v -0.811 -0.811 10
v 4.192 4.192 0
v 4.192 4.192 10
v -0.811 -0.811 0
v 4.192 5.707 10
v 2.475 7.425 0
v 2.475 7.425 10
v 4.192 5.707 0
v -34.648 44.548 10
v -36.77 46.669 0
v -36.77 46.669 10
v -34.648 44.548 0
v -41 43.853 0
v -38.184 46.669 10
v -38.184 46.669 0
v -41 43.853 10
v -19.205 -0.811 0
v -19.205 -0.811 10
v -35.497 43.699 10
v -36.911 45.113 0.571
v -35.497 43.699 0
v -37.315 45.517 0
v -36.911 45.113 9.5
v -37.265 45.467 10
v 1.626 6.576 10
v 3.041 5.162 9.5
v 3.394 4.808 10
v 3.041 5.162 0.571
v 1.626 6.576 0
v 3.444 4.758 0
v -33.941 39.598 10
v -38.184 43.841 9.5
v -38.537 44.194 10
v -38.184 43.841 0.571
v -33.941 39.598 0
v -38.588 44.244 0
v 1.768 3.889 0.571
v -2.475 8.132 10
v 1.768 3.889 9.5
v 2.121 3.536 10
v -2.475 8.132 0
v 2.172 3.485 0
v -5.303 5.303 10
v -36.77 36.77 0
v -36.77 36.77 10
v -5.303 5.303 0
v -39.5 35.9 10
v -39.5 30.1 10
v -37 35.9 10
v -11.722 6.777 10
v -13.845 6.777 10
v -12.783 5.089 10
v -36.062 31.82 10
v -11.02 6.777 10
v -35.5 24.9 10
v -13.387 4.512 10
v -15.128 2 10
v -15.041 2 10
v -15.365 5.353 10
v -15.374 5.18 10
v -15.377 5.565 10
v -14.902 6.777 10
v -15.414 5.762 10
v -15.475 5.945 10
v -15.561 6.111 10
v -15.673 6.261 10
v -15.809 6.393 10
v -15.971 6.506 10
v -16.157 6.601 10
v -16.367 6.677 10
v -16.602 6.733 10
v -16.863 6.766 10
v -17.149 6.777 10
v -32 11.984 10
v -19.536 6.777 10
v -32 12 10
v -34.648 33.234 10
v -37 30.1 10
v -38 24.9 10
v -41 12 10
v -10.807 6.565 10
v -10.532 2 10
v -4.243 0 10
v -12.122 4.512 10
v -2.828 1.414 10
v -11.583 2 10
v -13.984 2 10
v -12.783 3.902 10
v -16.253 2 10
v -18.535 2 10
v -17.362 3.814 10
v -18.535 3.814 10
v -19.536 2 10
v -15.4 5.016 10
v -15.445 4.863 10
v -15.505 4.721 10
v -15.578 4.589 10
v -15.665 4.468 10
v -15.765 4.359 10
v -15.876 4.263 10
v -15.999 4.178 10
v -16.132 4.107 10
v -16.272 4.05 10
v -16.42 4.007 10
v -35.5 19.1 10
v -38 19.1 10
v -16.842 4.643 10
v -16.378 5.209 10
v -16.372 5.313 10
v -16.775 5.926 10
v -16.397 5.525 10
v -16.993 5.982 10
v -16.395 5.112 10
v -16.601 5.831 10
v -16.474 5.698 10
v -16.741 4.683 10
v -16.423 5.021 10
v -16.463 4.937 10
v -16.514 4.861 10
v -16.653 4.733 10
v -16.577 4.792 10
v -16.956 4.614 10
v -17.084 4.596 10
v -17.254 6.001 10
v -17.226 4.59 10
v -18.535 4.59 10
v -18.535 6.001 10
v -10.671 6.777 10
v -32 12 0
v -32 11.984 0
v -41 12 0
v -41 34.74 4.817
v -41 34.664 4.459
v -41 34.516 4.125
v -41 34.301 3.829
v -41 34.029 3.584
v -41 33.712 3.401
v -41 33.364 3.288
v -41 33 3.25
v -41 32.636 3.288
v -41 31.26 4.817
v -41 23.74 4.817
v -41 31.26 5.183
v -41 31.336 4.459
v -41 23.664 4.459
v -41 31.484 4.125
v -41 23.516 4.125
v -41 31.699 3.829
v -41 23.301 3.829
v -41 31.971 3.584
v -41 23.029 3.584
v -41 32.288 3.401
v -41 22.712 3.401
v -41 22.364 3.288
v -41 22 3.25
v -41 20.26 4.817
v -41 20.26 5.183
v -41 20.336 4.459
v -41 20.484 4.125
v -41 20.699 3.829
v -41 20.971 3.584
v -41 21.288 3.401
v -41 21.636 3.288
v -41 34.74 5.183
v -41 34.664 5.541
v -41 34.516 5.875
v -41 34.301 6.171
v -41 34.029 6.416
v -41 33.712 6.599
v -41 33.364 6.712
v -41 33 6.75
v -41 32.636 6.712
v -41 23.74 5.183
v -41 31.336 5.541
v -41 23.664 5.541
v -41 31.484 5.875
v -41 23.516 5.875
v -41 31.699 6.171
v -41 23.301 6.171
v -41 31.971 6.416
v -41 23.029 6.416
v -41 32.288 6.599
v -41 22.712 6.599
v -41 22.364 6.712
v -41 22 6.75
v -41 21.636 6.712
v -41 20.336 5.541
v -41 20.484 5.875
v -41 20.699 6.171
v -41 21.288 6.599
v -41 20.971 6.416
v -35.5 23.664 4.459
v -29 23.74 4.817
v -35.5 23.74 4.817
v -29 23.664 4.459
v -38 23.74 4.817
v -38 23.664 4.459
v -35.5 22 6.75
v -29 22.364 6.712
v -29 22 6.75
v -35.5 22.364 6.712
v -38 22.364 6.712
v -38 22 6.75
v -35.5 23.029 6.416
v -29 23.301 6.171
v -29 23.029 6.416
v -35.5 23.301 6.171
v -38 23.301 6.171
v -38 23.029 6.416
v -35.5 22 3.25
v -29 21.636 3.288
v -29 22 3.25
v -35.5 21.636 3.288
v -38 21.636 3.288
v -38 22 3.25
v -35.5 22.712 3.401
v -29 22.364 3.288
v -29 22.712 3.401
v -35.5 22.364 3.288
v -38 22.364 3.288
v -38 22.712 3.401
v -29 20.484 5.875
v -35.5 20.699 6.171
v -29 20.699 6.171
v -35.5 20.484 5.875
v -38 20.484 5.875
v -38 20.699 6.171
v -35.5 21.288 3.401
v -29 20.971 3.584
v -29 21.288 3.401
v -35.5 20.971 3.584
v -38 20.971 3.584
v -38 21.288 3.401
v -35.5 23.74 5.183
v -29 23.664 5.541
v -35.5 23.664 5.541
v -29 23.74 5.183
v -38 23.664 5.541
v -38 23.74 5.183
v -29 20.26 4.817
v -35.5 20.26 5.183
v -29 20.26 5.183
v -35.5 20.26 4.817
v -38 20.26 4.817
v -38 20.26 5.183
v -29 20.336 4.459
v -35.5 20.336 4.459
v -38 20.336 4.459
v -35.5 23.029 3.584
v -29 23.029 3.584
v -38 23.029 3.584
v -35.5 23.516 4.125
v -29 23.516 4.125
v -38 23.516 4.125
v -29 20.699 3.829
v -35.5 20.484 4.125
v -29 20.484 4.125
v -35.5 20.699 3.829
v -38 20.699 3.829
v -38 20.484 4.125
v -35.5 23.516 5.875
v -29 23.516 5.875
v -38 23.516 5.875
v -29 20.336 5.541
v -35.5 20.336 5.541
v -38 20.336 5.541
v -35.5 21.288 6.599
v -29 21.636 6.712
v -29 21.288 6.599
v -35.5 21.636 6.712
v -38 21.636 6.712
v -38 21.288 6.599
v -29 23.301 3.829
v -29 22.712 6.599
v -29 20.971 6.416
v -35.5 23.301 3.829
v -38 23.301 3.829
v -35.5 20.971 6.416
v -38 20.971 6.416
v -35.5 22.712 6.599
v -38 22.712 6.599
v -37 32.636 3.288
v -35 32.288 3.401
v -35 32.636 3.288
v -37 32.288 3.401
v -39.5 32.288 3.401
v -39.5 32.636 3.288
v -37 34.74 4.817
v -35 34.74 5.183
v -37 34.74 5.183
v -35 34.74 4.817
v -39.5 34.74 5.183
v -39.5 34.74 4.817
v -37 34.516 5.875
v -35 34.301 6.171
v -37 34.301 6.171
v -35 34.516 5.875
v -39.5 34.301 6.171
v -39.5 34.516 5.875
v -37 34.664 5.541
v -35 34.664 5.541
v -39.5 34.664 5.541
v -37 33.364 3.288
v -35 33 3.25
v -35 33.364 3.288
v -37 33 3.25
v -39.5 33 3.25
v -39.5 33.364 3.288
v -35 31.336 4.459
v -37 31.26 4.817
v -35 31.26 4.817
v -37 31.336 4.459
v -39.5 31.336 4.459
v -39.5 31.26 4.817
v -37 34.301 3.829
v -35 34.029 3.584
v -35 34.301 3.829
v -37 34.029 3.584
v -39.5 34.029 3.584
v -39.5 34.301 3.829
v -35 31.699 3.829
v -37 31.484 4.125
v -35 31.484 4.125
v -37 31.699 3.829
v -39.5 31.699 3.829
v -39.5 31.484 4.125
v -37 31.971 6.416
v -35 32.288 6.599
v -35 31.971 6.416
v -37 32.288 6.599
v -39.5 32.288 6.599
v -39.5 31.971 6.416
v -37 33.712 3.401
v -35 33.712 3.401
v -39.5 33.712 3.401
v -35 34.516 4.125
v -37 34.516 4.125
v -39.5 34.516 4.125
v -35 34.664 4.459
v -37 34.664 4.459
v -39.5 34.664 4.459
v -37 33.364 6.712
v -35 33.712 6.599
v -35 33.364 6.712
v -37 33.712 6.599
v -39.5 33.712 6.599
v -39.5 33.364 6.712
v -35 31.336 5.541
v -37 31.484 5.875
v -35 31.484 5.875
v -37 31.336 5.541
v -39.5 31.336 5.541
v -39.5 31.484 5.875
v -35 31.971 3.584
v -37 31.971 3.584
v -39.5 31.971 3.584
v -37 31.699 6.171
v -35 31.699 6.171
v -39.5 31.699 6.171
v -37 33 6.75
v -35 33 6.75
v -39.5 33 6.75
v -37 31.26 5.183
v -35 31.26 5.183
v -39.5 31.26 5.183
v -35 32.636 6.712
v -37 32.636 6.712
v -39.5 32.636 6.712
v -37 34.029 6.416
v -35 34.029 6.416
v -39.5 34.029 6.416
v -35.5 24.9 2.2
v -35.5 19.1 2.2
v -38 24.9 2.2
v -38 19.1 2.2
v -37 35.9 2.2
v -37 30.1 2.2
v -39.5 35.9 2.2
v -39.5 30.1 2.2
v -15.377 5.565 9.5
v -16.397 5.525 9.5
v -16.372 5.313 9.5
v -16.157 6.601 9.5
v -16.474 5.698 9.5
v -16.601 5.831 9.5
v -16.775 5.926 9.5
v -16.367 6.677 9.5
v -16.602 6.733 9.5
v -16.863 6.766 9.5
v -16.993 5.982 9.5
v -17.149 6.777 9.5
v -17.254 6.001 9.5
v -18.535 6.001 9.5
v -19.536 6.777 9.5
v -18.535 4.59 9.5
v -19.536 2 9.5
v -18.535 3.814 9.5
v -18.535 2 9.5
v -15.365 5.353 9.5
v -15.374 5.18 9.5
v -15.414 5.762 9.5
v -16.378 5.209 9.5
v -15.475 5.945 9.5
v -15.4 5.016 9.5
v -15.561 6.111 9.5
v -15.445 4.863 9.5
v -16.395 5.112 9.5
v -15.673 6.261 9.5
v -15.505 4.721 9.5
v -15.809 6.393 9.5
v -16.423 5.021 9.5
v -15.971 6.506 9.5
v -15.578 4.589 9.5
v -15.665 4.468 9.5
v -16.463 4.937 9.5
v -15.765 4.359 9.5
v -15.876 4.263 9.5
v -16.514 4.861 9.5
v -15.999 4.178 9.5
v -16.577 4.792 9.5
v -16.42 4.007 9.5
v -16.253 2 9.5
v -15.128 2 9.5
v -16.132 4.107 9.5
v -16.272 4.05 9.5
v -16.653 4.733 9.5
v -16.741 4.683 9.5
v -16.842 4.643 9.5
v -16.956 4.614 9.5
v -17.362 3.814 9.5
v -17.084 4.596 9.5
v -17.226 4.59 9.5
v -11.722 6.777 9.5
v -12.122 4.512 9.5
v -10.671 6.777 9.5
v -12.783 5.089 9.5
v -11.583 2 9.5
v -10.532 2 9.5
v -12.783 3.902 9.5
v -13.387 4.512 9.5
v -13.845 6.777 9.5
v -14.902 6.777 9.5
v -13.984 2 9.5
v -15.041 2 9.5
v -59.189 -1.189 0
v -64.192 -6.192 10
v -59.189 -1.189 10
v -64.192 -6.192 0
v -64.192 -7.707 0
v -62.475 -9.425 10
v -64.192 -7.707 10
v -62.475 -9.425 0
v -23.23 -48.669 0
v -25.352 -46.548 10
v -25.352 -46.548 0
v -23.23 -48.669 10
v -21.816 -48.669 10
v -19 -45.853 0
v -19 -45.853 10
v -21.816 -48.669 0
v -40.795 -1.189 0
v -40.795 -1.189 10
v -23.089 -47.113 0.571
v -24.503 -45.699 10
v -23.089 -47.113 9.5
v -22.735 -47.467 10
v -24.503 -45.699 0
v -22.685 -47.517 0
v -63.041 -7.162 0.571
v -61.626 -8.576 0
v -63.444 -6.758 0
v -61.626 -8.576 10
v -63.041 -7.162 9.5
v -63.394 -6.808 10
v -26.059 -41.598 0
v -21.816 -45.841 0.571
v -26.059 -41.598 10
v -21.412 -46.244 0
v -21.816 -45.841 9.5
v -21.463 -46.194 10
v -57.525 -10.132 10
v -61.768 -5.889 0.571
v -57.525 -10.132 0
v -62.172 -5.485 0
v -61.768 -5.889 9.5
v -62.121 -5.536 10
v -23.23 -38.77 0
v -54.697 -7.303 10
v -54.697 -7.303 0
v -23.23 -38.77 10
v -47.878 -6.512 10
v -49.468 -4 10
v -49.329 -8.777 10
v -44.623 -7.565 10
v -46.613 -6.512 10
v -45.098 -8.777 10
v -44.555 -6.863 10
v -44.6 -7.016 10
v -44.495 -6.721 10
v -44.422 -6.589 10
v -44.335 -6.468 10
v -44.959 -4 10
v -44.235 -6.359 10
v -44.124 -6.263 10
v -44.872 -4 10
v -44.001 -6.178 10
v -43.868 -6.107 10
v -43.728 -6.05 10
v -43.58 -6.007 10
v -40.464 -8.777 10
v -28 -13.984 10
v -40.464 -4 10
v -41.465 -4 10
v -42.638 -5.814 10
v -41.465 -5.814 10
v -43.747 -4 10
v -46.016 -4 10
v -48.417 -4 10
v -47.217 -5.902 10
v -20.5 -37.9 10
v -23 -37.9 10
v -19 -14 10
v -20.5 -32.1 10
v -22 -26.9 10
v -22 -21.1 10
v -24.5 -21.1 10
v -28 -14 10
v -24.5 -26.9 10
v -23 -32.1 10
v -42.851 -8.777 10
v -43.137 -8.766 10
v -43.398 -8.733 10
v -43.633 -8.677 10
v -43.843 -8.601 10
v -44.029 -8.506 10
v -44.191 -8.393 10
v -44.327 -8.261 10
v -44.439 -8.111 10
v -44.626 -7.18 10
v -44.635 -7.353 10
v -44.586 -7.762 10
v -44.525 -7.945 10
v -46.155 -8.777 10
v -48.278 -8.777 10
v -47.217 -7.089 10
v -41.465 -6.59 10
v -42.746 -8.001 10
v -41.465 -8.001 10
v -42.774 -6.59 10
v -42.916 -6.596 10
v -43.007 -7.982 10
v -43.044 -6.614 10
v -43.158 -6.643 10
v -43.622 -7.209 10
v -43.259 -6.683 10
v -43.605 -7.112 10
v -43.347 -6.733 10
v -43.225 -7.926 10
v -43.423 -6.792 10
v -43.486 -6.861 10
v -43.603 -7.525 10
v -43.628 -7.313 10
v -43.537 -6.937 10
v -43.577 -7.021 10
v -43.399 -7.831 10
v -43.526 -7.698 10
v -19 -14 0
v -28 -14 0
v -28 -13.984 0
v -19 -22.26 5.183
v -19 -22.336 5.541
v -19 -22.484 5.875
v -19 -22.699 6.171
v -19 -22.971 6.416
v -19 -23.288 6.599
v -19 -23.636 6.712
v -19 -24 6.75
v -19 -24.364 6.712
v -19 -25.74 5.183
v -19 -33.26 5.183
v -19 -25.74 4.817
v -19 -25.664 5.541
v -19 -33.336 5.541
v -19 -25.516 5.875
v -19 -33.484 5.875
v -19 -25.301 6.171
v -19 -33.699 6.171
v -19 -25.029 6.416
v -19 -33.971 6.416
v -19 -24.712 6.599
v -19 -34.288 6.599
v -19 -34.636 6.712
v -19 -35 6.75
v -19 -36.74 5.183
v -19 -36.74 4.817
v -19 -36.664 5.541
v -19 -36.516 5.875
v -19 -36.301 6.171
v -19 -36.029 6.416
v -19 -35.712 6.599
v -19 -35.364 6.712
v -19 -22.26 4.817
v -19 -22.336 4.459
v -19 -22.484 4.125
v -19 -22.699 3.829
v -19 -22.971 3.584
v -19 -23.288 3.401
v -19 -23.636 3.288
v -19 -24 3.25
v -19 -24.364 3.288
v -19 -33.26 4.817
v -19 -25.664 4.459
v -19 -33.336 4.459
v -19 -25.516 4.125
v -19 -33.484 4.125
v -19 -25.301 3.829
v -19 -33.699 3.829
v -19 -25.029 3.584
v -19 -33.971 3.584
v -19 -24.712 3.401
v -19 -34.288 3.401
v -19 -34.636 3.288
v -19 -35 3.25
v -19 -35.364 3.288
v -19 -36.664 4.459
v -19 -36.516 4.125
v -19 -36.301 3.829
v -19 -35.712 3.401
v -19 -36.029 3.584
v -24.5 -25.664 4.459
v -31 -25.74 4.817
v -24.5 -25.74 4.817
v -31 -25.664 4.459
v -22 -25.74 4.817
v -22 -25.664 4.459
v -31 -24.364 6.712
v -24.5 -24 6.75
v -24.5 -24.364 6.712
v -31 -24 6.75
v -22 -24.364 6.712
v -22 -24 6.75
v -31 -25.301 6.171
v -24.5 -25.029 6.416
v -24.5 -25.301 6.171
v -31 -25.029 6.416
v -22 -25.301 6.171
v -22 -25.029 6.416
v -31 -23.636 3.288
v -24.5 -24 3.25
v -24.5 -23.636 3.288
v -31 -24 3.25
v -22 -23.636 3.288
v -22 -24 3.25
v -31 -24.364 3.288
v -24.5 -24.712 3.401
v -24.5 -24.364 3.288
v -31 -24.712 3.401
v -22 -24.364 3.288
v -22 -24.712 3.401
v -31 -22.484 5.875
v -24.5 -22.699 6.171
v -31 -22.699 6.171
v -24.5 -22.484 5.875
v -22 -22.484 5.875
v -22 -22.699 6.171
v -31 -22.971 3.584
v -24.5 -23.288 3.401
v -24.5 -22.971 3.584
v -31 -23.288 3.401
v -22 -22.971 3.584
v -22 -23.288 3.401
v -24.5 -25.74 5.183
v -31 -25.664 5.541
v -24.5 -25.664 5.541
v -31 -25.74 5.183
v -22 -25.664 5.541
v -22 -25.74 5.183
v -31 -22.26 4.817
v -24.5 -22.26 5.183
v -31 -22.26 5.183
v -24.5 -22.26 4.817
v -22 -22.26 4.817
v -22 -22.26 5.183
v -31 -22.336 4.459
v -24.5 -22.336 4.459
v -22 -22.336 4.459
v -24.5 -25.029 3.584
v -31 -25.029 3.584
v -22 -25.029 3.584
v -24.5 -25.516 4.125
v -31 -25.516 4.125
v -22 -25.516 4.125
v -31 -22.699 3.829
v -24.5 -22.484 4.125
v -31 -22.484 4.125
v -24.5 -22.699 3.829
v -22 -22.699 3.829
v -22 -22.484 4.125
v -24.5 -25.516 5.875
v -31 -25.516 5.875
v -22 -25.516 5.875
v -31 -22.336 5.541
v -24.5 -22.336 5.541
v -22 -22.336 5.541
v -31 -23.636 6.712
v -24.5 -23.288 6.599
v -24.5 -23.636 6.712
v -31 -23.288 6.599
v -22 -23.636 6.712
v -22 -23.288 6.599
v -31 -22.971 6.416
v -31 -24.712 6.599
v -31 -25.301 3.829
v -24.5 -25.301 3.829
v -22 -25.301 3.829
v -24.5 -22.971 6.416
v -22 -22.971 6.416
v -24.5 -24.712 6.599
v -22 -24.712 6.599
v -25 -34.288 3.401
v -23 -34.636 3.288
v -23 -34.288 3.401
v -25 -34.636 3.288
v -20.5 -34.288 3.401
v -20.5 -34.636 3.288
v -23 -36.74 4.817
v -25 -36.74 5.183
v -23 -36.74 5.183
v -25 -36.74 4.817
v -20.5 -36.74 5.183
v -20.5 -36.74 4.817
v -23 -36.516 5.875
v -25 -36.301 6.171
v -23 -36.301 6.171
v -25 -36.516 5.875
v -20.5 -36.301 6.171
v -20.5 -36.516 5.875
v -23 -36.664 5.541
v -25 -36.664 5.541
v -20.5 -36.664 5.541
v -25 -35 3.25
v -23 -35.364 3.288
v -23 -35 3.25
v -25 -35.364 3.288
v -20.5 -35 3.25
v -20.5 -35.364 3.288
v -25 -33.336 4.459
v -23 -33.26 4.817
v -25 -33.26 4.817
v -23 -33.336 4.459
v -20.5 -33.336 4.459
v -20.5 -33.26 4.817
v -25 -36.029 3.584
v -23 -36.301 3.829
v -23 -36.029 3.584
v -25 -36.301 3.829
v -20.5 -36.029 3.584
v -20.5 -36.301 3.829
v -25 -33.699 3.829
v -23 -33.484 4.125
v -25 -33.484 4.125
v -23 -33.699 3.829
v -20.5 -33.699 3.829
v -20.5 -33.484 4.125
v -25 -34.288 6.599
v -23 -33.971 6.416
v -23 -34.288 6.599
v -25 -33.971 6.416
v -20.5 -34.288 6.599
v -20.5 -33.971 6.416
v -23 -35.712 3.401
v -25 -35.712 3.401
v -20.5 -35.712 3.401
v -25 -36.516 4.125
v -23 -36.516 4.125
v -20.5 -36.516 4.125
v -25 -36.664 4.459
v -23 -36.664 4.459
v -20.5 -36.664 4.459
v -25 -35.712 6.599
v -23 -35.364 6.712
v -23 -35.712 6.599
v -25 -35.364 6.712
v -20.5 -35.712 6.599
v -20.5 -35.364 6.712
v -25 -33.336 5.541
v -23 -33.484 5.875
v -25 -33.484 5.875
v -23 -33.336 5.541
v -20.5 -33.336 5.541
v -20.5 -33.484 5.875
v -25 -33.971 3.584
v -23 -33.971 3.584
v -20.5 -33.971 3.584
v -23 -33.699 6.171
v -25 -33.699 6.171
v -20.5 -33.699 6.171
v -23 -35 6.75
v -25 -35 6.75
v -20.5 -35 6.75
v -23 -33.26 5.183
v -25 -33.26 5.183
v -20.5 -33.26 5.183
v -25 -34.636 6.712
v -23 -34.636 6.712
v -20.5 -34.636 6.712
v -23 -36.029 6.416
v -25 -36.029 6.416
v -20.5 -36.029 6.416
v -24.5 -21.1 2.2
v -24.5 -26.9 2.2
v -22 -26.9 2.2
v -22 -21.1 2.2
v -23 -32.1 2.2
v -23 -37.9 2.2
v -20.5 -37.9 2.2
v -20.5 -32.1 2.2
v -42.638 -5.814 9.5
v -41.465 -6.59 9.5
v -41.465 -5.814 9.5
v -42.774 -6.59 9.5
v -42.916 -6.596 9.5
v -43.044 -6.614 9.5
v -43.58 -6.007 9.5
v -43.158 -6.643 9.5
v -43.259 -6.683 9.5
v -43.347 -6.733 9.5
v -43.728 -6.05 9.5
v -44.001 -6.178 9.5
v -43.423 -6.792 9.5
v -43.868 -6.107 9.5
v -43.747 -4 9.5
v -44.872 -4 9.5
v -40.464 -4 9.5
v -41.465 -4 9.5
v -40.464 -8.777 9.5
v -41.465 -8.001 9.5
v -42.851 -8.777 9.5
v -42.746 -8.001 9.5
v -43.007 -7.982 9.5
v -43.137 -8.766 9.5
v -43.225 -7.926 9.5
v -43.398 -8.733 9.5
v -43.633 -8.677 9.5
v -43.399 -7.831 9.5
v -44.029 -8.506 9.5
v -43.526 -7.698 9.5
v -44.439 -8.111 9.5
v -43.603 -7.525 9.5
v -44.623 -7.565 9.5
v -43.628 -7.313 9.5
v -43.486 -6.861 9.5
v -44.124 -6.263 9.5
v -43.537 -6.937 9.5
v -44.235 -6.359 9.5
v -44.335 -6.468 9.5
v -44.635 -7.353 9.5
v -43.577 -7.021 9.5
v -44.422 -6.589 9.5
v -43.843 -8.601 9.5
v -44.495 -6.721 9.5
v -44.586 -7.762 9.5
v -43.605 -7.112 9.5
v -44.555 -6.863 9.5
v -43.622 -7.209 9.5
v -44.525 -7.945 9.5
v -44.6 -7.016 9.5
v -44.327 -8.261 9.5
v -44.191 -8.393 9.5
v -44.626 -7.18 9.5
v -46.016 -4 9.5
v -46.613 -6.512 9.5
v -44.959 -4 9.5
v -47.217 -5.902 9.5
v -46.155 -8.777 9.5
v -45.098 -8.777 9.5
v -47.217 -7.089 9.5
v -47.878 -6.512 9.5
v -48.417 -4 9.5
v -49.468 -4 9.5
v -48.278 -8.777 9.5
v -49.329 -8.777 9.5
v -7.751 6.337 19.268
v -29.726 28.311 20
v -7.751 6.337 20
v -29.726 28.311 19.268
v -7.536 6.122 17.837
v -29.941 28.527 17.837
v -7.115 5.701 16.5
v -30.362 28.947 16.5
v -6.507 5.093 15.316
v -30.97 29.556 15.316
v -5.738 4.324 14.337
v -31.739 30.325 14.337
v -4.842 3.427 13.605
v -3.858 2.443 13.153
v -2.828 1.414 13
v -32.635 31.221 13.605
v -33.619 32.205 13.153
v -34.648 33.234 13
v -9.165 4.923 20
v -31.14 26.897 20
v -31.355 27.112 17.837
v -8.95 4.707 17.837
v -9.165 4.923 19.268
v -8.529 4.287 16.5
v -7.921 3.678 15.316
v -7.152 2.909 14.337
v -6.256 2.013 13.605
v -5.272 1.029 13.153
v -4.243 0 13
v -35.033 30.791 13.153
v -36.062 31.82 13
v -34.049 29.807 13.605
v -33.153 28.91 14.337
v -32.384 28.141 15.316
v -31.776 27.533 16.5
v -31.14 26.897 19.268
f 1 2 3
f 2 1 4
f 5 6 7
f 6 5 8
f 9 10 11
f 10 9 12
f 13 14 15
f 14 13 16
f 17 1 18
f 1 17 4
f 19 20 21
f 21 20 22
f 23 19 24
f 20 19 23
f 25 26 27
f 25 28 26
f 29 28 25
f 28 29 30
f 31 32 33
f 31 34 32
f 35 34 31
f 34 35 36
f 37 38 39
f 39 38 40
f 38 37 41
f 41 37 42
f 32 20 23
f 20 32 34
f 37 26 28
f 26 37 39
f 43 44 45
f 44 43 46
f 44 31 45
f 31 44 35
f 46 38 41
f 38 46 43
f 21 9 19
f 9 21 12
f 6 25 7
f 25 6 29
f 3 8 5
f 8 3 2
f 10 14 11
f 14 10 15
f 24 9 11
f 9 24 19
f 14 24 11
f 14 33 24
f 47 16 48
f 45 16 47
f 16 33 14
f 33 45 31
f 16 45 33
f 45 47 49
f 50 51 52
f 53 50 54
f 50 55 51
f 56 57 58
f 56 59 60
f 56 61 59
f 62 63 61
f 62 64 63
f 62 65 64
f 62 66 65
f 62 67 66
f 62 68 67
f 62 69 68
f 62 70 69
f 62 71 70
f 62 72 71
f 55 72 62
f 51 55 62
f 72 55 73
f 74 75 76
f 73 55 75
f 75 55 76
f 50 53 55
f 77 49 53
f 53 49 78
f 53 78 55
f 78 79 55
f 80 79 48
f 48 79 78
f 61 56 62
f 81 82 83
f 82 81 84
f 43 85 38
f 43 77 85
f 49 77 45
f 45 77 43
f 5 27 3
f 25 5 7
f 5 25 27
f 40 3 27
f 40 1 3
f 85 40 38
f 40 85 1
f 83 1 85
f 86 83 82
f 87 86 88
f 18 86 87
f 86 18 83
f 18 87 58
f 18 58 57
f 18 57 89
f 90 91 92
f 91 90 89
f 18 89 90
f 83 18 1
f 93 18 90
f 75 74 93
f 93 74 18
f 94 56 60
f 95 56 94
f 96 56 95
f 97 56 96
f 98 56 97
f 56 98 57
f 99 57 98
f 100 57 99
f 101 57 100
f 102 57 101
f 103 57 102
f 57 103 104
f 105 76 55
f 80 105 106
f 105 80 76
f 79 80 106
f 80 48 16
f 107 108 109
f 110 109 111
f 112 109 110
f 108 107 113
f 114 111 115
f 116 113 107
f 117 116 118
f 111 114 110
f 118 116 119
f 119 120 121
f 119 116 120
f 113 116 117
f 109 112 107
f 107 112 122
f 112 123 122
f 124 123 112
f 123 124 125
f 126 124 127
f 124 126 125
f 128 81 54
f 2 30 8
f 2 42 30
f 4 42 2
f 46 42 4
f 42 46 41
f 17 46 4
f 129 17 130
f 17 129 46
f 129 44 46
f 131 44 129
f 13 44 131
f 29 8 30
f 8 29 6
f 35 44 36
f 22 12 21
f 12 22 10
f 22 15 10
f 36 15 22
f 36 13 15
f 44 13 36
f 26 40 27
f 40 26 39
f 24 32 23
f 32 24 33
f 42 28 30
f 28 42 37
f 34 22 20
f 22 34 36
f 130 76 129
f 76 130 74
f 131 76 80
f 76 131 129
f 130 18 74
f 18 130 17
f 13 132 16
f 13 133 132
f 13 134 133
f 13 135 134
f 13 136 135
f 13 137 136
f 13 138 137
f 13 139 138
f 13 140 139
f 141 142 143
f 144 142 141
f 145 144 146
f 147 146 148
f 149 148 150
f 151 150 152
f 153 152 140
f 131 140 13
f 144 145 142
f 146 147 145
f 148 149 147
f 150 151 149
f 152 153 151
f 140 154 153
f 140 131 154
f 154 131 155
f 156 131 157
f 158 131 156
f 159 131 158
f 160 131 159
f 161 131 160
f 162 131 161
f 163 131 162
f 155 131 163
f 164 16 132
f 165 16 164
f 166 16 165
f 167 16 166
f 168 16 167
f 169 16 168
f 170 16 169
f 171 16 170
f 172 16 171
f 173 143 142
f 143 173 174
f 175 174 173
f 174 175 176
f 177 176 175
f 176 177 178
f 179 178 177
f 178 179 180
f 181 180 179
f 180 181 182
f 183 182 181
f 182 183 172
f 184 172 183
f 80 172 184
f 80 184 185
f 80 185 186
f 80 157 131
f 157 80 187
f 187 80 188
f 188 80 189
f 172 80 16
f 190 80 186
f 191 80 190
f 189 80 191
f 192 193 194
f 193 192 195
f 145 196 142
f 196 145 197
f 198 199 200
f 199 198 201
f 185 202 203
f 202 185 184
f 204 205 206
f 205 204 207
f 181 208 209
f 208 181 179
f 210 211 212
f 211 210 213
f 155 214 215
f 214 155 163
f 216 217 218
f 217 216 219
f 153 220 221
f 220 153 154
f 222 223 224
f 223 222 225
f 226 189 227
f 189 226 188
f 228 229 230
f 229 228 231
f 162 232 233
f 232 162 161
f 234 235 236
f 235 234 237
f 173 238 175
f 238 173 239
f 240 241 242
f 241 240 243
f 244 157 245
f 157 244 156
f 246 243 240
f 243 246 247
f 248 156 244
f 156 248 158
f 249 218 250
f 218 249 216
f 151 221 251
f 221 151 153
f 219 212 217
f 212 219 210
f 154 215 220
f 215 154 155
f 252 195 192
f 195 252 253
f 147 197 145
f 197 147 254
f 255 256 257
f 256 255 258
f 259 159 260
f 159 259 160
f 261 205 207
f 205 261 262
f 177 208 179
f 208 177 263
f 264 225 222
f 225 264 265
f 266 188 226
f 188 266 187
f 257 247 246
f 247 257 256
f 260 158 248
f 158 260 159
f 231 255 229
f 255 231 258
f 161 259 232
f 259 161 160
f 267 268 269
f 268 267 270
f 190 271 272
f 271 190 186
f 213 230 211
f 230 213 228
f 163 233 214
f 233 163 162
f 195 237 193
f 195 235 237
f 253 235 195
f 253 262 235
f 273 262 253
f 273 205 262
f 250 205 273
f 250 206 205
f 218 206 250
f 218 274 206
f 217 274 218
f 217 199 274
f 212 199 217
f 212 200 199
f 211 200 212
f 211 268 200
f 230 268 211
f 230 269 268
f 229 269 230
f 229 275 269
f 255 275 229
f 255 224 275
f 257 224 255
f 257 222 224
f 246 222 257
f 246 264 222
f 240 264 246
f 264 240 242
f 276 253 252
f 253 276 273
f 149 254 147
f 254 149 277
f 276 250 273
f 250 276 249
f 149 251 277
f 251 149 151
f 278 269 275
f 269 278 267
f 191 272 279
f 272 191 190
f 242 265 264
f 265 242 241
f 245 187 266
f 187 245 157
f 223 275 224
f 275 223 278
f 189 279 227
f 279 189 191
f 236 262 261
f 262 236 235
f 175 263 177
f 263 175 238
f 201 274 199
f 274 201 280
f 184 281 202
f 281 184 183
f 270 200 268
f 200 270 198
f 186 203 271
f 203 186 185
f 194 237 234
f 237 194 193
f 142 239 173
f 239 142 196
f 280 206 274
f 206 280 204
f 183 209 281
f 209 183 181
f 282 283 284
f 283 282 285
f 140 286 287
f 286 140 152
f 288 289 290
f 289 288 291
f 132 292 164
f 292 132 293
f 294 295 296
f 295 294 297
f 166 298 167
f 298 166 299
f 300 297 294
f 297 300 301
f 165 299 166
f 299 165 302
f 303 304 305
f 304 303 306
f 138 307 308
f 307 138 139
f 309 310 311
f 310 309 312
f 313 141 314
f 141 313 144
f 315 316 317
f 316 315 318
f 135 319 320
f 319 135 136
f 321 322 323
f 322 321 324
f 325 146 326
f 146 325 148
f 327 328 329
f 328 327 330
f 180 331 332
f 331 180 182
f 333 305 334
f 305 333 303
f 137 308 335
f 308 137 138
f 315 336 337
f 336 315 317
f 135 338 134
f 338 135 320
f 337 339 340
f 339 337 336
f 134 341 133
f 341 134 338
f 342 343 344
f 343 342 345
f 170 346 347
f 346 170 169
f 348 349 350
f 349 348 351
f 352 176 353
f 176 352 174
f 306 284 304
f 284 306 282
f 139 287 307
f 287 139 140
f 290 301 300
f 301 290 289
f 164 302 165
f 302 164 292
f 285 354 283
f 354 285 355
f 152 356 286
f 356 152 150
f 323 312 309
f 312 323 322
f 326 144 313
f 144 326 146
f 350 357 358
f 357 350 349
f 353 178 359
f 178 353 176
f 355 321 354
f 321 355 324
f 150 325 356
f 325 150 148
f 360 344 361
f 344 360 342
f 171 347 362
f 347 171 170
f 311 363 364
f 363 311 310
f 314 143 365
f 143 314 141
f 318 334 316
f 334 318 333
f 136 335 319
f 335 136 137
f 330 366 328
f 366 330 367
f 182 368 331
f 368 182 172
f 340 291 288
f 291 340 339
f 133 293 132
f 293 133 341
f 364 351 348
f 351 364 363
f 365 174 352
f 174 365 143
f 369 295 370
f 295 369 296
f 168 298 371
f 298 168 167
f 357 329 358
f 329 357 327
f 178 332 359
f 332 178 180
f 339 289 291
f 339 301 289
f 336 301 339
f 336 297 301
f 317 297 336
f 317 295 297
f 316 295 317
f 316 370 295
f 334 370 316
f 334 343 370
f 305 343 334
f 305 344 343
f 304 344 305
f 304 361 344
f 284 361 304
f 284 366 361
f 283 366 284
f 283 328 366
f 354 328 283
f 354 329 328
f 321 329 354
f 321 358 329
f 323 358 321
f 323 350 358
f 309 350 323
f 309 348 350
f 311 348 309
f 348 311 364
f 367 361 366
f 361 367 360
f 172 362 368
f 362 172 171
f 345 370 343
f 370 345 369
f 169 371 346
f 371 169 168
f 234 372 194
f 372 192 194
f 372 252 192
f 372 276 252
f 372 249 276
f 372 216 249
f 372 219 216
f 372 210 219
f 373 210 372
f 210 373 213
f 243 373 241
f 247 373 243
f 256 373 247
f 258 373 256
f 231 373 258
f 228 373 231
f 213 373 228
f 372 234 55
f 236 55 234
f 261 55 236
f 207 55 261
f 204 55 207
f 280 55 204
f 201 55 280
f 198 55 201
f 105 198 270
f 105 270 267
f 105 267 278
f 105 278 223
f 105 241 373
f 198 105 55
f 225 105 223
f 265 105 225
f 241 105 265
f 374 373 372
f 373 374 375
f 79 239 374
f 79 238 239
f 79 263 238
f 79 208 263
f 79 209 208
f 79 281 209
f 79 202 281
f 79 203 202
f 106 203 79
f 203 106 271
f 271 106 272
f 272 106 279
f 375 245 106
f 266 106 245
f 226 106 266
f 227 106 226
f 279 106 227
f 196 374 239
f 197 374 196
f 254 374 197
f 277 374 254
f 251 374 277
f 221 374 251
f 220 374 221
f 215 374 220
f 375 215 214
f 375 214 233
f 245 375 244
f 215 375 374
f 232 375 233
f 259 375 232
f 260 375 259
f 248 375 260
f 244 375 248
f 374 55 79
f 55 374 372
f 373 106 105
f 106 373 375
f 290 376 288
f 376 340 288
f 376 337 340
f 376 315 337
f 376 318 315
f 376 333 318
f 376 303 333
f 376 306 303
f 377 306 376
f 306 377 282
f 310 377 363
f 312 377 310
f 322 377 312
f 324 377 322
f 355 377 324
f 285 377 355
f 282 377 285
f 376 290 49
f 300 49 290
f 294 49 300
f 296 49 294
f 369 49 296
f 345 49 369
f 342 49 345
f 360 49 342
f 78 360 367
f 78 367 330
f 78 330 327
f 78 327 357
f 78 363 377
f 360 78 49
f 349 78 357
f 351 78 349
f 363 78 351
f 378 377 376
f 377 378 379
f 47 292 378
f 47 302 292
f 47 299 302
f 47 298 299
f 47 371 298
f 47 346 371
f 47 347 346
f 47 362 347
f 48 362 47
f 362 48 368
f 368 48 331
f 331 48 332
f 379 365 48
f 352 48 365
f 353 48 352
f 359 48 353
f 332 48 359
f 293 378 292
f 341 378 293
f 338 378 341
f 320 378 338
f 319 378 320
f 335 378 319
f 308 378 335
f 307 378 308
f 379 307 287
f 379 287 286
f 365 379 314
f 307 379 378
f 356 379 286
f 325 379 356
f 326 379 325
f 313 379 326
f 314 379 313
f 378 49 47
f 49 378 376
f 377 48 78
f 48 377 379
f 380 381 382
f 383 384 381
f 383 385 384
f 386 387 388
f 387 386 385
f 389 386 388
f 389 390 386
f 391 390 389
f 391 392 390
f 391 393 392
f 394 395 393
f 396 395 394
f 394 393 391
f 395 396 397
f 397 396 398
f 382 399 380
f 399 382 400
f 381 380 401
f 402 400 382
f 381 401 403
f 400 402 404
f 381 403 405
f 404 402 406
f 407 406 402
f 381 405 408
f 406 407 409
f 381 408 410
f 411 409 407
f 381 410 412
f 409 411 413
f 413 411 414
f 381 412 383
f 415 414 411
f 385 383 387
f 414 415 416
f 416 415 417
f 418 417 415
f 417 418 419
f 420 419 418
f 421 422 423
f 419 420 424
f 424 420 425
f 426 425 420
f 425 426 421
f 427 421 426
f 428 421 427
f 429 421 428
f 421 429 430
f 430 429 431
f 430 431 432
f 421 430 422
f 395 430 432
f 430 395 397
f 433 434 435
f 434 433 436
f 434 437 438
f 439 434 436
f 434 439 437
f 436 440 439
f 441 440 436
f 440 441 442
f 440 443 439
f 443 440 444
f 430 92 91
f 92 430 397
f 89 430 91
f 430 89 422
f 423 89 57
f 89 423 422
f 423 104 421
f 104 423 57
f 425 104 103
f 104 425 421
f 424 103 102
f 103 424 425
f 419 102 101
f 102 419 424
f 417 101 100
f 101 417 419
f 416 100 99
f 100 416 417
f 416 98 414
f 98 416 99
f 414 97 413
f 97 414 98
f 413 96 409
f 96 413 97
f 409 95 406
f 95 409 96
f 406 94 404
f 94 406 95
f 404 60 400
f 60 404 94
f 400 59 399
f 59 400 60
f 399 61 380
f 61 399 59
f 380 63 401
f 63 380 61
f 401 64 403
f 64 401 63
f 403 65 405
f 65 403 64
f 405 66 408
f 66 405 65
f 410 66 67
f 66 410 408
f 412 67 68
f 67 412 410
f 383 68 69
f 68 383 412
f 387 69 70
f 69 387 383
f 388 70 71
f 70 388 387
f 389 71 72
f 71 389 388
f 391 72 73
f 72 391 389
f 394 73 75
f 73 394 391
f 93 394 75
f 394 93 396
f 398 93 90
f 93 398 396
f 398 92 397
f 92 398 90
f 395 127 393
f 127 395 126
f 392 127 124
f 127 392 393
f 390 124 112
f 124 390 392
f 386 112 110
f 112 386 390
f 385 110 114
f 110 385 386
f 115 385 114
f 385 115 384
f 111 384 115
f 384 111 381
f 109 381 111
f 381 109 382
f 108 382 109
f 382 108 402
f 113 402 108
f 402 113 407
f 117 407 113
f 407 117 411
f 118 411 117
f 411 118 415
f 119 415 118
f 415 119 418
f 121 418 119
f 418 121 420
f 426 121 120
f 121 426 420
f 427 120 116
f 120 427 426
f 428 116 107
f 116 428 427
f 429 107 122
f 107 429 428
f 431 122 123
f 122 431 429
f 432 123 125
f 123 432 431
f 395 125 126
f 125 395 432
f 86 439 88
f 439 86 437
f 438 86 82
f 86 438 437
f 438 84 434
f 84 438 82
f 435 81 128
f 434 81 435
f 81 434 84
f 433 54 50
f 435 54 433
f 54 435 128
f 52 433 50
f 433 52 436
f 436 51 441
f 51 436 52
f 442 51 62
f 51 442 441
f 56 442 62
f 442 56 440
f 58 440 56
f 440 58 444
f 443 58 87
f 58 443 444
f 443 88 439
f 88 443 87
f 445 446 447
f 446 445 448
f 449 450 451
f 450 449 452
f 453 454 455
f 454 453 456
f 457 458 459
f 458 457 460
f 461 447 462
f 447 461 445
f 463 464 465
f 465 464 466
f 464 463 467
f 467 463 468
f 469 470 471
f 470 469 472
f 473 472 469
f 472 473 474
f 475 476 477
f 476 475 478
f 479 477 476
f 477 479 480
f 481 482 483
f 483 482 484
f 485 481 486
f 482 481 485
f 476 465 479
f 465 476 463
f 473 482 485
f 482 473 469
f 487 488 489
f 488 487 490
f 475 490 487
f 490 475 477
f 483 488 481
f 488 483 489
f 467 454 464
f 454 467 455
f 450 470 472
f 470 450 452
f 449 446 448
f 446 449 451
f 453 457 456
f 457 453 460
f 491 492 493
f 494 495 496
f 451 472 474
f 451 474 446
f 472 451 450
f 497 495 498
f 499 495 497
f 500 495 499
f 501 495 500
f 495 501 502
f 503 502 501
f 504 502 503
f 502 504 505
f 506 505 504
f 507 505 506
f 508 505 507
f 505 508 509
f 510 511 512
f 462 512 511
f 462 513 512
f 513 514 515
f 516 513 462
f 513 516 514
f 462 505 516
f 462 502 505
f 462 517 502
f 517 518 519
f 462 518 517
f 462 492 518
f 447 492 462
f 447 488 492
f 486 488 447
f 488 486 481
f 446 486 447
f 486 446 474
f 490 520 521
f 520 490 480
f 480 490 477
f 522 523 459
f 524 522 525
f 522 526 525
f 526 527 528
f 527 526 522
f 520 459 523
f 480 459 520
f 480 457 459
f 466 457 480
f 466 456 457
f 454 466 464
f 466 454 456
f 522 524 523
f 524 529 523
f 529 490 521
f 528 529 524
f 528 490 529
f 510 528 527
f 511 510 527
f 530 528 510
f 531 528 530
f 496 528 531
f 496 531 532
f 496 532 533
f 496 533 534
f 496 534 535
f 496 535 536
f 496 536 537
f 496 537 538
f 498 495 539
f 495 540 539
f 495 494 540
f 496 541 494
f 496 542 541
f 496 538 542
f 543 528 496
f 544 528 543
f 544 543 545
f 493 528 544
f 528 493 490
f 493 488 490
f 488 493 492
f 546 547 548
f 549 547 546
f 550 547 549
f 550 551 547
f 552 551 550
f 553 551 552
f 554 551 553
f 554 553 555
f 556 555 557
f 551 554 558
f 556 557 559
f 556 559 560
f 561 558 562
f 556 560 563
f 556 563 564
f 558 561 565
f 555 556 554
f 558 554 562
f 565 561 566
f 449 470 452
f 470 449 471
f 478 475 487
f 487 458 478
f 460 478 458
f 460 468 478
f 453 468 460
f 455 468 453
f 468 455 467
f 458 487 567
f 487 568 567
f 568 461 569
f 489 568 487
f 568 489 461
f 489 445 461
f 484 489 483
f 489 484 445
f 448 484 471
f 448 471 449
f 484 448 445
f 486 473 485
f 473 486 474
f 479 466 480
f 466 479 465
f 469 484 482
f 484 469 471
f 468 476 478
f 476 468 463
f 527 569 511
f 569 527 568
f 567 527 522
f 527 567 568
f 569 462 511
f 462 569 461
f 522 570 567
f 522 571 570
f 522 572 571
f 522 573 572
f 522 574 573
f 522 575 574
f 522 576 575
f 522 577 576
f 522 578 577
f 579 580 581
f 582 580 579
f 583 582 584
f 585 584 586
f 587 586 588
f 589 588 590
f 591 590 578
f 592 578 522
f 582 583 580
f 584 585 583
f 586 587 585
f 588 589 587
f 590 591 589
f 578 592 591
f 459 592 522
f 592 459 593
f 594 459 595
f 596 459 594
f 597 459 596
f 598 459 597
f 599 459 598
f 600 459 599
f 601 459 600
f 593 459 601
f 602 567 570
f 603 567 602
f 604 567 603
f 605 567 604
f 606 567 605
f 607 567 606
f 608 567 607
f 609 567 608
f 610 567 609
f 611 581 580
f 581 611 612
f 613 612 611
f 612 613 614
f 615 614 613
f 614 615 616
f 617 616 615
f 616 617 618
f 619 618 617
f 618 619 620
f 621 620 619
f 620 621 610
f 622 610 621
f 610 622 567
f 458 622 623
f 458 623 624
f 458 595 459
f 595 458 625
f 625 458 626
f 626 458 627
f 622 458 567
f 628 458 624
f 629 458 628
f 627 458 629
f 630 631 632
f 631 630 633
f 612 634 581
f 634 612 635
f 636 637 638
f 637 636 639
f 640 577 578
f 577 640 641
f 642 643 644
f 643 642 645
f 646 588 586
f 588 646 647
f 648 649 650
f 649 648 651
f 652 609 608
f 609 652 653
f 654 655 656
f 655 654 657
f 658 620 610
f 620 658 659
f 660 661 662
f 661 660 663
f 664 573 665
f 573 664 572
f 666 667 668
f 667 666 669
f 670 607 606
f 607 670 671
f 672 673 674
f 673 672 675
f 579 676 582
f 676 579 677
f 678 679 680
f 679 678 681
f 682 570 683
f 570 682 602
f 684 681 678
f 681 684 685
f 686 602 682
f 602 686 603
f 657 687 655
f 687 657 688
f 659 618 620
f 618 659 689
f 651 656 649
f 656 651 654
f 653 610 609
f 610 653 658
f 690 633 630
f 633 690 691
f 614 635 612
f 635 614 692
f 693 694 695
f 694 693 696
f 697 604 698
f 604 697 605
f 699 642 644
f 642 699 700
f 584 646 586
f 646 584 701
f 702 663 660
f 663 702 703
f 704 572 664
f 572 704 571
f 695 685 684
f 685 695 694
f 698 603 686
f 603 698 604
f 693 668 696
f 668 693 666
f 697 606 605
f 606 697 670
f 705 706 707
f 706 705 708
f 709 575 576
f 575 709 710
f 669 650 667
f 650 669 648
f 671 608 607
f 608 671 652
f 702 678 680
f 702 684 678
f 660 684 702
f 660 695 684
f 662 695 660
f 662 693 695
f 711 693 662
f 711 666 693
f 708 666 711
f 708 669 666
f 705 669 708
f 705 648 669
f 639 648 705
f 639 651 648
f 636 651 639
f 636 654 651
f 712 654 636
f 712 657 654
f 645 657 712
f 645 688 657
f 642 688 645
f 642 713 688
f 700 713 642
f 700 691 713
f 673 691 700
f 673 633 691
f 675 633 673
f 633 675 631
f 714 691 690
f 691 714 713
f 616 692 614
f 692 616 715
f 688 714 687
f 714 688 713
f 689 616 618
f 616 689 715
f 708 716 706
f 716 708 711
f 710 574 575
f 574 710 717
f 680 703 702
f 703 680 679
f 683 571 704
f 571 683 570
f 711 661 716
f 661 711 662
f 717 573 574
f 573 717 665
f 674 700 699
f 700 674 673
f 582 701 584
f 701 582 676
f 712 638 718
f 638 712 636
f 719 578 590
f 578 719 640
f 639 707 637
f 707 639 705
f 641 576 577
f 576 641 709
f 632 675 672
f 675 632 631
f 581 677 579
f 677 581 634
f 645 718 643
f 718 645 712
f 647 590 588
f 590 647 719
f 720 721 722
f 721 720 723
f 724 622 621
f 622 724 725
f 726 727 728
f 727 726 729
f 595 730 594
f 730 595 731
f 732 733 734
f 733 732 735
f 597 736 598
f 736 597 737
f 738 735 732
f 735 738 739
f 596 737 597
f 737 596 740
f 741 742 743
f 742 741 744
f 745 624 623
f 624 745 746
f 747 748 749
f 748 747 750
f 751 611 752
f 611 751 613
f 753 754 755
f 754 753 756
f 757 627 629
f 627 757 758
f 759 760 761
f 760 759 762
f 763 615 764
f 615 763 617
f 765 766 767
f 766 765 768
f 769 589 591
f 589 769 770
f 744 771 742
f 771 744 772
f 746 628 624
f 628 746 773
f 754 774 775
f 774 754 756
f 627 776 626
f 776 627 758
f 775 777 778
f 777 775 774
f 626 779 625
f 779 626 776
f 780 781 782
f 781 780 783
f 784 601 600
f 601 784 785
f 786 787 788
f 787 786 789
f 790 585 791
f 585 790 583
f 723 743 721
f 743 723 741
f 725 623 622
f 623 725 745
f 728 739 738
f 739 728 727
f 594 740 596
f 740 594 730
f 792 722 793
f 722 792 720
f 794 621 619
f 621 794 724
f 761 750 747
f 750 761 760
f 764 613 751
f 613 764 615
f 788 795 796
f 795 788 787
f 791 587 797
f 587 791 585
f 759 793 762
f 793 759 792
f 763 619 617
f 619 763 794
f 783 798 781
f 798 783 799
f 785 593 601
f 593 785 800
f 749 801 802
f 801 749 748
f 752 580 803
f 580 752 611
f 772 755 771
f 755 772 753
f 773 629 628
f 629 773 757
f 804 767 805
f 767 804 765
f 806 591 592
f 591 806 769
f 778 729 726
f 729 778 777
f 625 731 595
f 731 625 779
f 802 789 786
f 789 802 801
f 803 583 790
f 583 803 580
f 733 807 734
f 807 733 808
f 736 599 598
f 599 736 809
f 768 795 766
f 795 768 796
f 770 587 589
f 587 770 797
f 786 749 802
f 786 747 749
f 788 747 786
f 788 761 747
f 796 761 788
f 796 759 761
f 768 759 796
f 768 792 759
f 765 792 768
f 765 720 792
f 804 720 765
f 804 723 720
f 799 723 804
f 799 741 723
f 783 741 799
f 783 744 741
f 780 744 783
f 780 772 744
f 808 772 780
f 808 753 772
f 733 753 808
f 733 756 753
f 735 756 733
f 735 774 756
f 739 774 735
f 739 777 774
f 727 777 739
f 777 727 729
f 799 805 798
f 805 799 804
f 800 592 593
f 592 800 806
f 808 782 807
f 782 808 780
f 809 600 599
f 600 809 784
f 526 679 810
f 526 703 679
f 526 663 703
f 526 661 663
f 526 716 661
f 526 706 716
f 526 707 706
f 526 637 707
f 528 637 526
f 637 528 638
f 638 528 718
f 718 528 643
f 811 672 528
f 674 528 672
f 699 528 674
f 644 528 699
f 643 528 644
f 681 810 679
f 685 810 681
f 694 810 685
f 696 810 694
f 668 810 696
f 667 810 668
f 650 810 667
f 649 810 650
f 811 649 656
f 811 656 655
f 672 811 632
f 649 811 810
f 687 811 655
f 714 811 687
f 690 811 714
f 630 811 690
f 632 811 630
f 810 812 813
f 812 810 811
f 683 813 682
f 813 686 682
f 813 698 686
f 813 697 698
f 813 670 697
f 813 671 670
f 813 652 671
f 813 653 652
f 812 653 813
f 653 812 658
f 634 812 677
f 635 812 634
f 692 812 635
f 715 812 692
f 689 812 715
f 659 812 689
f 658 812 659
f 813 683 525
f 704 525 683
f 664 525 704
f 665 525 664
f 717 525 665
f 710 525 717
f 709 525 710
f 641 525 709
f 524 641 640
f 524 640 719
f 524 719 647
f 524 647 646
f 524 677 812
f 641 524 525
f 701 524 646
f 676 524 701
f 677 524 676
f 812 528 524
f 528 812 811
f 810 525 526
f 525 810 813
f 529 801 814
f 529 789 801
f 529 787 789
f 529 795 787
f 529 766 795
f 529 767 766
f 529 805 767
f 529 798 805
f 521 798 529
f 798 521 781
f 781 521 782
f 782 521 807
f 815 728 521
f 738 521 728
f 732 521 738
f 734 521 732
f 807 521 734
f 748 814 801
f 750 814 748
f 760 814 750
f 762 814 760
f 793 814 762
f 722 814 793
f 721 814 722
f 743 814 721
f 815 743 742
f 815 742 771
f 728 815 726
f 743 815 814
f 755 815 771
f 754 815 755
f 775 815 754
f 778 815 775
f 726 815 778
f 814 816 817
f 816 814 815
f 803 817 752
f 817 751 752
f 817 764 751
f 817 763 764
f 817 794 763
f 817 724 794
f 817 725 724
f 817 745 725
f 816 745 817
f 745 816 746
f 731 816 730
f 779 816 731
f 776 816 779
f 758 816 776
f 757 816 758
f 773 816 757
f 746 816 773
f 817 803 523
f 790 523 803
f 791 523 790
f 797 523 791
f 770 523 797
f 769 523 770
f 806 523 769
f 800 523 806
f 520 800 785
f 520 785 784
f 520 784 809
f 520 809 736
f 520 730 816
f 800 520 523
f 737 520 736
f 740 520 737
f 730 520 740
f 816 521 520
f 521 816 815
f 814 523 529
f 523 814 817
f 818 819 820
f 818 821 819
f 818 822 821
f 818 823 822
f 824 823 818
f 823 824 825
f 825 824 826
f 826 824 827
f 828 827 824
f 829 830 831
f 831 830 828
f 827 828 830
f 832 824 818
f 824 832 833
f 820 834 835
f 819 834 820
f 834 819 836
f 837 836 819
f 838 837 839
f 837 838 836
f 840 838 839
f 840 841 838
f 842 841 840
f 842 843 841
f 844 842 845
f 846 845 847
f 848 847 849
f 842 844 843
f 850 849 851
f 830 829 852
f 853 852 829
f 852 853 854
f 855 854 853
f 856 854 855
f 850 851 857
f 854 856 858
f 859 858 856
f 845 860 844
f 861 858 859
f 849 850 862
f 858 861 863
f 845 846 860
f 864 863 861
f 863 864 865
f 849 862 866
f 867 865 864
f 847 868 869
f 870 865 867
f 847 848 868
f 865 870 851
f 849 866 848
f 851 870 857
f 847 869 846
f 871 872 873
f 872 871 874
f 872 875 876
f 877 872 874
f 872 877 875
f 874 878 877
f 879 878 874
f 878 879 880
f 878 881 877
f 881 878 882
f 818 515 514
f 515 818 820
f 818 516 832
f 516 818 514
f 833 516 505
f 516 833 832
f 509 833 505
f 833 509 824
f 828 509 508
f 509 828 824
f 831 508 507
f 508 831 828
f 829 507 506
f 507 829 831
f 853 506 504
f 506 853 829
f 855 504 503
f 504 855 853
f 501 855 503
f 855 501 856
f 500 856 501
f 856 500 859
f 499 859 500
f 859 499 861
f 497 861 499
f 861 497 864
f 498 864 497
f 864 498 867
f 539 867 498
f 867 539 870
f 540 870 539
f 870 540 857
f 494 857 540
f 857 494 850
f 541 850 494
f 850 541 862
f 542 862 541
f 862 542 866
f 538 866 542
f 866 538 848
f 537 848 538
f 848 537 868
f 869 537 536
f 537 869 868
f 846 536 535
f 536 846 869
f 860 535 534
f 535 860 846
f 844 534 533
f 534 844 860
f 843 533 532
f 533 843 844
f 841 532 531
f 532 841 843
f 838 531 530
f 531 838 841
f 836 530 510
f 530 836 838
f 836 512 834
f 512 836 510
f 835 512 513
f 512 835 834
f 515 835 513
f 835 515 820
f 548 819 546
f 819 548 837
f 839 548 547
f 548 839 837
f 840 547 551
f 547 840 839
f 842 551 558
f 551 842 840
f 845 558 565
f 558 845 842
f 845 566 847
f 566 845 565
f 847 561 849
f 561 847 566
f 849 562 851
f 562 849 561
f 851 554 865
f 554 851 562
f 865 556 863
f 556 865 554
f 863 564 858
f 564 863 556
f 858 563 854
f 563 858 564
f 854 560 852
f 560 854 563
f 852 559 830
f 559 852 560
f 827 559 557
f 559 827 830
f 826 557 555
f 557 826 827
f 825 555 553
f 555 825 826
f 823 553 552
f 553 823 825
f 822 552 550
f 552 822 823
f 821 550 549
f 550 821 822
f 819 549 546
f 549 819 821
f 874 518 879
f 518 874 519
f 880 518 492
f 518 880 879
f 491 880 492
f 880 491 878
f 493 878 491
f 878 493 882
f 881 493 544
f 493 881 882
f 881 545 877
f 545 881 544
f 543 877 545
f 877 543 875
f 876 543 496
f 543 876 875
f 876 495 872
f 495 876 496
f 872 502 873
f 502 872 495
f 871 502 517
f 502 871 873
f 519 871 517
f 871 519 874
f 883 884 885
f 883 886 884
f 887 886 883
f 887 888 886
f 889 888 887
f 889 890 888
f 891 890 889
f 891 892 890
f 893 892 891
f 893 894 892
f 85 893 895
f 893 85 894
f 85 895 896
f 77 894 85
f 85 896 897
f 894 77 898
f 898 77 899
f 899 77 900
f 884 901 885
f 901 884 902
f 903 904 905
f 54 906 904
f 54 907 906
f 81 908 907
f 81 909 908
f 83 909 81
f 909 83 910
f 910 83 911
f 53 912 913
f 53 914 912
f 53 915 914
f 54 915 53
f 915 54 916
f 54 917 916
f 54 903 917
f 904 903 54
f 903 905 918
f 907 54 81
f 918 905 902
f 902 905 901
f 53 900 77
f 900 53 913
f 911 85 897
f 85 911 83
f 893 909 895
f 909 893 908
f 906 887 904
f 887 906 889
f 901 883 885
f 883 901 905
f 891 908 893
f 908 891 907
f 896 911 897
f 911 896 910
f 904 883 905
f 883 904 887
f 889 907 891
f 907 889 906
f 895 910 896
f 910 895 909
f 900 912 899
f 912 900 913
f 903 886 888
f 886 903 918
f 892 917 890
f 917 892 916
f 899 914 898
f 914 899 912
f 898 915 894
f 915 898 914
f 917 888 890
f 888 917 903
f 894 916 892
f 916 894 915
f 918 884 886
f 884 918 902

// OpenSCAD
// PRUSA iteration4
// lcd supports
// GNU GPL v3
// Josef Průša <iam@josefprusa.cz> and contributors
// http://www.reprap.org/wiki/Prusa_Mendel
// http://prusamendel.org




module body()
{

    difference() 
        {
        // base block
        translate([-55,-2,0]) cube([69,81,10]); 

            union ()
            {
                // outer body shape
                translate([-69.6,32,-1]) rotate([0,0,45]) cube([60,53,15]); 
                translate([13.7,89.7,-1]) rotate([0,0,135]) cube([60,42,15]);
                translate([-19,-9,-1]) cube([60,9,15] );   
                translate([7,-3,-1]) cube([60,68,16]);  
                translate([-16,60,-1]) cube([60,50,15] );
                translate([-41, -45,-1]) rotate([0,0,45]) cube([60,80,13]);  
                
                // pcb cout out
                translate([4,1.5,-1]) cube([1.8,56.5,17]); 
                translate([0,7.5,-1]) cube([5.8,44.5,17]); 
                translate([4.8,3.5,-1]) cube([5.8,52.5,17]);
                translate([8,-5,-1] ) rotate([0,0,45]) cube([5,5,17]);
                translate([8,58,-1]) rotate([0,0,45]) cube([5,5,17]);
            }

            // pcb inserts
            translate([4,3,8]) rotate([45,0,0]) cube([1.8,5,5]); 
            translate([4,56.5,8]) rotate([45,0,0]) cube([1.8,5,5]);     
            translate([4,3,-5]) rotate([45,0,0]) cube([1.8,5,5]); 
            translate([4,56.5,-5]) rotate([45,0,0]) cube([1.8,5,5]);     
        }
}



module support()
{
    difference() 
    {
    
        union()
        {
            rotate([0,0,45]) body();
            // screw block
            translate([-72,22,0])  cube([30,16,10]);    
        }
        
        // lower angled part cut  
        translate([-62,-2,-1]) cube([30,14,15]);    
        translate([-32,-16.3,-1]) rotate([0,0,45]) cube([20,20,15]);    
        
        translate([-91,-2,-1]) cube([50,50,17]);
        
        // screw holes
        translate([-51,18+4,5]) rotate([0,90,0]) cylinder(h=22, r=1.75, $fn=30);  
        translate([-52,29+4,5]) rotate([0,90,0]) cylinder(h=17, r=1.75, $fn=30);  
        
        // nut traps
        translate([-38,15.1+4,5-2.8]) cube([2.5,5.8,29.7]);    
        translate([-39.5,26.1+4,5-2.8]) cube([2.5,5.8,29.7]); 
     
        // version
        translate([-20,2,9.5]) rotate([0,0,0]) linear_extrude(height = 0.6) 
        { text("RX",font = "helvetica:style=Bold", size=5, center=true); }   
    }
}


module left_lcd_support()
{
    support();
     
    rotate([0,0,45]) difference()
    {
        // sd card shield
        translate([-3,3,10])  cube([2,45,10]); 
        translate([-4,3,20]) rotate([0,90,0]) cylinder( h=4, r=7, $fn=30); 
        translate([-4,48,20]) rotate([0,90,0]) cylinder( h=4, r=7, $fn=30); 
    }
}

translate([-60,-2,0]) rotate([0,0,180]) support();
left_lcd_support();

 
